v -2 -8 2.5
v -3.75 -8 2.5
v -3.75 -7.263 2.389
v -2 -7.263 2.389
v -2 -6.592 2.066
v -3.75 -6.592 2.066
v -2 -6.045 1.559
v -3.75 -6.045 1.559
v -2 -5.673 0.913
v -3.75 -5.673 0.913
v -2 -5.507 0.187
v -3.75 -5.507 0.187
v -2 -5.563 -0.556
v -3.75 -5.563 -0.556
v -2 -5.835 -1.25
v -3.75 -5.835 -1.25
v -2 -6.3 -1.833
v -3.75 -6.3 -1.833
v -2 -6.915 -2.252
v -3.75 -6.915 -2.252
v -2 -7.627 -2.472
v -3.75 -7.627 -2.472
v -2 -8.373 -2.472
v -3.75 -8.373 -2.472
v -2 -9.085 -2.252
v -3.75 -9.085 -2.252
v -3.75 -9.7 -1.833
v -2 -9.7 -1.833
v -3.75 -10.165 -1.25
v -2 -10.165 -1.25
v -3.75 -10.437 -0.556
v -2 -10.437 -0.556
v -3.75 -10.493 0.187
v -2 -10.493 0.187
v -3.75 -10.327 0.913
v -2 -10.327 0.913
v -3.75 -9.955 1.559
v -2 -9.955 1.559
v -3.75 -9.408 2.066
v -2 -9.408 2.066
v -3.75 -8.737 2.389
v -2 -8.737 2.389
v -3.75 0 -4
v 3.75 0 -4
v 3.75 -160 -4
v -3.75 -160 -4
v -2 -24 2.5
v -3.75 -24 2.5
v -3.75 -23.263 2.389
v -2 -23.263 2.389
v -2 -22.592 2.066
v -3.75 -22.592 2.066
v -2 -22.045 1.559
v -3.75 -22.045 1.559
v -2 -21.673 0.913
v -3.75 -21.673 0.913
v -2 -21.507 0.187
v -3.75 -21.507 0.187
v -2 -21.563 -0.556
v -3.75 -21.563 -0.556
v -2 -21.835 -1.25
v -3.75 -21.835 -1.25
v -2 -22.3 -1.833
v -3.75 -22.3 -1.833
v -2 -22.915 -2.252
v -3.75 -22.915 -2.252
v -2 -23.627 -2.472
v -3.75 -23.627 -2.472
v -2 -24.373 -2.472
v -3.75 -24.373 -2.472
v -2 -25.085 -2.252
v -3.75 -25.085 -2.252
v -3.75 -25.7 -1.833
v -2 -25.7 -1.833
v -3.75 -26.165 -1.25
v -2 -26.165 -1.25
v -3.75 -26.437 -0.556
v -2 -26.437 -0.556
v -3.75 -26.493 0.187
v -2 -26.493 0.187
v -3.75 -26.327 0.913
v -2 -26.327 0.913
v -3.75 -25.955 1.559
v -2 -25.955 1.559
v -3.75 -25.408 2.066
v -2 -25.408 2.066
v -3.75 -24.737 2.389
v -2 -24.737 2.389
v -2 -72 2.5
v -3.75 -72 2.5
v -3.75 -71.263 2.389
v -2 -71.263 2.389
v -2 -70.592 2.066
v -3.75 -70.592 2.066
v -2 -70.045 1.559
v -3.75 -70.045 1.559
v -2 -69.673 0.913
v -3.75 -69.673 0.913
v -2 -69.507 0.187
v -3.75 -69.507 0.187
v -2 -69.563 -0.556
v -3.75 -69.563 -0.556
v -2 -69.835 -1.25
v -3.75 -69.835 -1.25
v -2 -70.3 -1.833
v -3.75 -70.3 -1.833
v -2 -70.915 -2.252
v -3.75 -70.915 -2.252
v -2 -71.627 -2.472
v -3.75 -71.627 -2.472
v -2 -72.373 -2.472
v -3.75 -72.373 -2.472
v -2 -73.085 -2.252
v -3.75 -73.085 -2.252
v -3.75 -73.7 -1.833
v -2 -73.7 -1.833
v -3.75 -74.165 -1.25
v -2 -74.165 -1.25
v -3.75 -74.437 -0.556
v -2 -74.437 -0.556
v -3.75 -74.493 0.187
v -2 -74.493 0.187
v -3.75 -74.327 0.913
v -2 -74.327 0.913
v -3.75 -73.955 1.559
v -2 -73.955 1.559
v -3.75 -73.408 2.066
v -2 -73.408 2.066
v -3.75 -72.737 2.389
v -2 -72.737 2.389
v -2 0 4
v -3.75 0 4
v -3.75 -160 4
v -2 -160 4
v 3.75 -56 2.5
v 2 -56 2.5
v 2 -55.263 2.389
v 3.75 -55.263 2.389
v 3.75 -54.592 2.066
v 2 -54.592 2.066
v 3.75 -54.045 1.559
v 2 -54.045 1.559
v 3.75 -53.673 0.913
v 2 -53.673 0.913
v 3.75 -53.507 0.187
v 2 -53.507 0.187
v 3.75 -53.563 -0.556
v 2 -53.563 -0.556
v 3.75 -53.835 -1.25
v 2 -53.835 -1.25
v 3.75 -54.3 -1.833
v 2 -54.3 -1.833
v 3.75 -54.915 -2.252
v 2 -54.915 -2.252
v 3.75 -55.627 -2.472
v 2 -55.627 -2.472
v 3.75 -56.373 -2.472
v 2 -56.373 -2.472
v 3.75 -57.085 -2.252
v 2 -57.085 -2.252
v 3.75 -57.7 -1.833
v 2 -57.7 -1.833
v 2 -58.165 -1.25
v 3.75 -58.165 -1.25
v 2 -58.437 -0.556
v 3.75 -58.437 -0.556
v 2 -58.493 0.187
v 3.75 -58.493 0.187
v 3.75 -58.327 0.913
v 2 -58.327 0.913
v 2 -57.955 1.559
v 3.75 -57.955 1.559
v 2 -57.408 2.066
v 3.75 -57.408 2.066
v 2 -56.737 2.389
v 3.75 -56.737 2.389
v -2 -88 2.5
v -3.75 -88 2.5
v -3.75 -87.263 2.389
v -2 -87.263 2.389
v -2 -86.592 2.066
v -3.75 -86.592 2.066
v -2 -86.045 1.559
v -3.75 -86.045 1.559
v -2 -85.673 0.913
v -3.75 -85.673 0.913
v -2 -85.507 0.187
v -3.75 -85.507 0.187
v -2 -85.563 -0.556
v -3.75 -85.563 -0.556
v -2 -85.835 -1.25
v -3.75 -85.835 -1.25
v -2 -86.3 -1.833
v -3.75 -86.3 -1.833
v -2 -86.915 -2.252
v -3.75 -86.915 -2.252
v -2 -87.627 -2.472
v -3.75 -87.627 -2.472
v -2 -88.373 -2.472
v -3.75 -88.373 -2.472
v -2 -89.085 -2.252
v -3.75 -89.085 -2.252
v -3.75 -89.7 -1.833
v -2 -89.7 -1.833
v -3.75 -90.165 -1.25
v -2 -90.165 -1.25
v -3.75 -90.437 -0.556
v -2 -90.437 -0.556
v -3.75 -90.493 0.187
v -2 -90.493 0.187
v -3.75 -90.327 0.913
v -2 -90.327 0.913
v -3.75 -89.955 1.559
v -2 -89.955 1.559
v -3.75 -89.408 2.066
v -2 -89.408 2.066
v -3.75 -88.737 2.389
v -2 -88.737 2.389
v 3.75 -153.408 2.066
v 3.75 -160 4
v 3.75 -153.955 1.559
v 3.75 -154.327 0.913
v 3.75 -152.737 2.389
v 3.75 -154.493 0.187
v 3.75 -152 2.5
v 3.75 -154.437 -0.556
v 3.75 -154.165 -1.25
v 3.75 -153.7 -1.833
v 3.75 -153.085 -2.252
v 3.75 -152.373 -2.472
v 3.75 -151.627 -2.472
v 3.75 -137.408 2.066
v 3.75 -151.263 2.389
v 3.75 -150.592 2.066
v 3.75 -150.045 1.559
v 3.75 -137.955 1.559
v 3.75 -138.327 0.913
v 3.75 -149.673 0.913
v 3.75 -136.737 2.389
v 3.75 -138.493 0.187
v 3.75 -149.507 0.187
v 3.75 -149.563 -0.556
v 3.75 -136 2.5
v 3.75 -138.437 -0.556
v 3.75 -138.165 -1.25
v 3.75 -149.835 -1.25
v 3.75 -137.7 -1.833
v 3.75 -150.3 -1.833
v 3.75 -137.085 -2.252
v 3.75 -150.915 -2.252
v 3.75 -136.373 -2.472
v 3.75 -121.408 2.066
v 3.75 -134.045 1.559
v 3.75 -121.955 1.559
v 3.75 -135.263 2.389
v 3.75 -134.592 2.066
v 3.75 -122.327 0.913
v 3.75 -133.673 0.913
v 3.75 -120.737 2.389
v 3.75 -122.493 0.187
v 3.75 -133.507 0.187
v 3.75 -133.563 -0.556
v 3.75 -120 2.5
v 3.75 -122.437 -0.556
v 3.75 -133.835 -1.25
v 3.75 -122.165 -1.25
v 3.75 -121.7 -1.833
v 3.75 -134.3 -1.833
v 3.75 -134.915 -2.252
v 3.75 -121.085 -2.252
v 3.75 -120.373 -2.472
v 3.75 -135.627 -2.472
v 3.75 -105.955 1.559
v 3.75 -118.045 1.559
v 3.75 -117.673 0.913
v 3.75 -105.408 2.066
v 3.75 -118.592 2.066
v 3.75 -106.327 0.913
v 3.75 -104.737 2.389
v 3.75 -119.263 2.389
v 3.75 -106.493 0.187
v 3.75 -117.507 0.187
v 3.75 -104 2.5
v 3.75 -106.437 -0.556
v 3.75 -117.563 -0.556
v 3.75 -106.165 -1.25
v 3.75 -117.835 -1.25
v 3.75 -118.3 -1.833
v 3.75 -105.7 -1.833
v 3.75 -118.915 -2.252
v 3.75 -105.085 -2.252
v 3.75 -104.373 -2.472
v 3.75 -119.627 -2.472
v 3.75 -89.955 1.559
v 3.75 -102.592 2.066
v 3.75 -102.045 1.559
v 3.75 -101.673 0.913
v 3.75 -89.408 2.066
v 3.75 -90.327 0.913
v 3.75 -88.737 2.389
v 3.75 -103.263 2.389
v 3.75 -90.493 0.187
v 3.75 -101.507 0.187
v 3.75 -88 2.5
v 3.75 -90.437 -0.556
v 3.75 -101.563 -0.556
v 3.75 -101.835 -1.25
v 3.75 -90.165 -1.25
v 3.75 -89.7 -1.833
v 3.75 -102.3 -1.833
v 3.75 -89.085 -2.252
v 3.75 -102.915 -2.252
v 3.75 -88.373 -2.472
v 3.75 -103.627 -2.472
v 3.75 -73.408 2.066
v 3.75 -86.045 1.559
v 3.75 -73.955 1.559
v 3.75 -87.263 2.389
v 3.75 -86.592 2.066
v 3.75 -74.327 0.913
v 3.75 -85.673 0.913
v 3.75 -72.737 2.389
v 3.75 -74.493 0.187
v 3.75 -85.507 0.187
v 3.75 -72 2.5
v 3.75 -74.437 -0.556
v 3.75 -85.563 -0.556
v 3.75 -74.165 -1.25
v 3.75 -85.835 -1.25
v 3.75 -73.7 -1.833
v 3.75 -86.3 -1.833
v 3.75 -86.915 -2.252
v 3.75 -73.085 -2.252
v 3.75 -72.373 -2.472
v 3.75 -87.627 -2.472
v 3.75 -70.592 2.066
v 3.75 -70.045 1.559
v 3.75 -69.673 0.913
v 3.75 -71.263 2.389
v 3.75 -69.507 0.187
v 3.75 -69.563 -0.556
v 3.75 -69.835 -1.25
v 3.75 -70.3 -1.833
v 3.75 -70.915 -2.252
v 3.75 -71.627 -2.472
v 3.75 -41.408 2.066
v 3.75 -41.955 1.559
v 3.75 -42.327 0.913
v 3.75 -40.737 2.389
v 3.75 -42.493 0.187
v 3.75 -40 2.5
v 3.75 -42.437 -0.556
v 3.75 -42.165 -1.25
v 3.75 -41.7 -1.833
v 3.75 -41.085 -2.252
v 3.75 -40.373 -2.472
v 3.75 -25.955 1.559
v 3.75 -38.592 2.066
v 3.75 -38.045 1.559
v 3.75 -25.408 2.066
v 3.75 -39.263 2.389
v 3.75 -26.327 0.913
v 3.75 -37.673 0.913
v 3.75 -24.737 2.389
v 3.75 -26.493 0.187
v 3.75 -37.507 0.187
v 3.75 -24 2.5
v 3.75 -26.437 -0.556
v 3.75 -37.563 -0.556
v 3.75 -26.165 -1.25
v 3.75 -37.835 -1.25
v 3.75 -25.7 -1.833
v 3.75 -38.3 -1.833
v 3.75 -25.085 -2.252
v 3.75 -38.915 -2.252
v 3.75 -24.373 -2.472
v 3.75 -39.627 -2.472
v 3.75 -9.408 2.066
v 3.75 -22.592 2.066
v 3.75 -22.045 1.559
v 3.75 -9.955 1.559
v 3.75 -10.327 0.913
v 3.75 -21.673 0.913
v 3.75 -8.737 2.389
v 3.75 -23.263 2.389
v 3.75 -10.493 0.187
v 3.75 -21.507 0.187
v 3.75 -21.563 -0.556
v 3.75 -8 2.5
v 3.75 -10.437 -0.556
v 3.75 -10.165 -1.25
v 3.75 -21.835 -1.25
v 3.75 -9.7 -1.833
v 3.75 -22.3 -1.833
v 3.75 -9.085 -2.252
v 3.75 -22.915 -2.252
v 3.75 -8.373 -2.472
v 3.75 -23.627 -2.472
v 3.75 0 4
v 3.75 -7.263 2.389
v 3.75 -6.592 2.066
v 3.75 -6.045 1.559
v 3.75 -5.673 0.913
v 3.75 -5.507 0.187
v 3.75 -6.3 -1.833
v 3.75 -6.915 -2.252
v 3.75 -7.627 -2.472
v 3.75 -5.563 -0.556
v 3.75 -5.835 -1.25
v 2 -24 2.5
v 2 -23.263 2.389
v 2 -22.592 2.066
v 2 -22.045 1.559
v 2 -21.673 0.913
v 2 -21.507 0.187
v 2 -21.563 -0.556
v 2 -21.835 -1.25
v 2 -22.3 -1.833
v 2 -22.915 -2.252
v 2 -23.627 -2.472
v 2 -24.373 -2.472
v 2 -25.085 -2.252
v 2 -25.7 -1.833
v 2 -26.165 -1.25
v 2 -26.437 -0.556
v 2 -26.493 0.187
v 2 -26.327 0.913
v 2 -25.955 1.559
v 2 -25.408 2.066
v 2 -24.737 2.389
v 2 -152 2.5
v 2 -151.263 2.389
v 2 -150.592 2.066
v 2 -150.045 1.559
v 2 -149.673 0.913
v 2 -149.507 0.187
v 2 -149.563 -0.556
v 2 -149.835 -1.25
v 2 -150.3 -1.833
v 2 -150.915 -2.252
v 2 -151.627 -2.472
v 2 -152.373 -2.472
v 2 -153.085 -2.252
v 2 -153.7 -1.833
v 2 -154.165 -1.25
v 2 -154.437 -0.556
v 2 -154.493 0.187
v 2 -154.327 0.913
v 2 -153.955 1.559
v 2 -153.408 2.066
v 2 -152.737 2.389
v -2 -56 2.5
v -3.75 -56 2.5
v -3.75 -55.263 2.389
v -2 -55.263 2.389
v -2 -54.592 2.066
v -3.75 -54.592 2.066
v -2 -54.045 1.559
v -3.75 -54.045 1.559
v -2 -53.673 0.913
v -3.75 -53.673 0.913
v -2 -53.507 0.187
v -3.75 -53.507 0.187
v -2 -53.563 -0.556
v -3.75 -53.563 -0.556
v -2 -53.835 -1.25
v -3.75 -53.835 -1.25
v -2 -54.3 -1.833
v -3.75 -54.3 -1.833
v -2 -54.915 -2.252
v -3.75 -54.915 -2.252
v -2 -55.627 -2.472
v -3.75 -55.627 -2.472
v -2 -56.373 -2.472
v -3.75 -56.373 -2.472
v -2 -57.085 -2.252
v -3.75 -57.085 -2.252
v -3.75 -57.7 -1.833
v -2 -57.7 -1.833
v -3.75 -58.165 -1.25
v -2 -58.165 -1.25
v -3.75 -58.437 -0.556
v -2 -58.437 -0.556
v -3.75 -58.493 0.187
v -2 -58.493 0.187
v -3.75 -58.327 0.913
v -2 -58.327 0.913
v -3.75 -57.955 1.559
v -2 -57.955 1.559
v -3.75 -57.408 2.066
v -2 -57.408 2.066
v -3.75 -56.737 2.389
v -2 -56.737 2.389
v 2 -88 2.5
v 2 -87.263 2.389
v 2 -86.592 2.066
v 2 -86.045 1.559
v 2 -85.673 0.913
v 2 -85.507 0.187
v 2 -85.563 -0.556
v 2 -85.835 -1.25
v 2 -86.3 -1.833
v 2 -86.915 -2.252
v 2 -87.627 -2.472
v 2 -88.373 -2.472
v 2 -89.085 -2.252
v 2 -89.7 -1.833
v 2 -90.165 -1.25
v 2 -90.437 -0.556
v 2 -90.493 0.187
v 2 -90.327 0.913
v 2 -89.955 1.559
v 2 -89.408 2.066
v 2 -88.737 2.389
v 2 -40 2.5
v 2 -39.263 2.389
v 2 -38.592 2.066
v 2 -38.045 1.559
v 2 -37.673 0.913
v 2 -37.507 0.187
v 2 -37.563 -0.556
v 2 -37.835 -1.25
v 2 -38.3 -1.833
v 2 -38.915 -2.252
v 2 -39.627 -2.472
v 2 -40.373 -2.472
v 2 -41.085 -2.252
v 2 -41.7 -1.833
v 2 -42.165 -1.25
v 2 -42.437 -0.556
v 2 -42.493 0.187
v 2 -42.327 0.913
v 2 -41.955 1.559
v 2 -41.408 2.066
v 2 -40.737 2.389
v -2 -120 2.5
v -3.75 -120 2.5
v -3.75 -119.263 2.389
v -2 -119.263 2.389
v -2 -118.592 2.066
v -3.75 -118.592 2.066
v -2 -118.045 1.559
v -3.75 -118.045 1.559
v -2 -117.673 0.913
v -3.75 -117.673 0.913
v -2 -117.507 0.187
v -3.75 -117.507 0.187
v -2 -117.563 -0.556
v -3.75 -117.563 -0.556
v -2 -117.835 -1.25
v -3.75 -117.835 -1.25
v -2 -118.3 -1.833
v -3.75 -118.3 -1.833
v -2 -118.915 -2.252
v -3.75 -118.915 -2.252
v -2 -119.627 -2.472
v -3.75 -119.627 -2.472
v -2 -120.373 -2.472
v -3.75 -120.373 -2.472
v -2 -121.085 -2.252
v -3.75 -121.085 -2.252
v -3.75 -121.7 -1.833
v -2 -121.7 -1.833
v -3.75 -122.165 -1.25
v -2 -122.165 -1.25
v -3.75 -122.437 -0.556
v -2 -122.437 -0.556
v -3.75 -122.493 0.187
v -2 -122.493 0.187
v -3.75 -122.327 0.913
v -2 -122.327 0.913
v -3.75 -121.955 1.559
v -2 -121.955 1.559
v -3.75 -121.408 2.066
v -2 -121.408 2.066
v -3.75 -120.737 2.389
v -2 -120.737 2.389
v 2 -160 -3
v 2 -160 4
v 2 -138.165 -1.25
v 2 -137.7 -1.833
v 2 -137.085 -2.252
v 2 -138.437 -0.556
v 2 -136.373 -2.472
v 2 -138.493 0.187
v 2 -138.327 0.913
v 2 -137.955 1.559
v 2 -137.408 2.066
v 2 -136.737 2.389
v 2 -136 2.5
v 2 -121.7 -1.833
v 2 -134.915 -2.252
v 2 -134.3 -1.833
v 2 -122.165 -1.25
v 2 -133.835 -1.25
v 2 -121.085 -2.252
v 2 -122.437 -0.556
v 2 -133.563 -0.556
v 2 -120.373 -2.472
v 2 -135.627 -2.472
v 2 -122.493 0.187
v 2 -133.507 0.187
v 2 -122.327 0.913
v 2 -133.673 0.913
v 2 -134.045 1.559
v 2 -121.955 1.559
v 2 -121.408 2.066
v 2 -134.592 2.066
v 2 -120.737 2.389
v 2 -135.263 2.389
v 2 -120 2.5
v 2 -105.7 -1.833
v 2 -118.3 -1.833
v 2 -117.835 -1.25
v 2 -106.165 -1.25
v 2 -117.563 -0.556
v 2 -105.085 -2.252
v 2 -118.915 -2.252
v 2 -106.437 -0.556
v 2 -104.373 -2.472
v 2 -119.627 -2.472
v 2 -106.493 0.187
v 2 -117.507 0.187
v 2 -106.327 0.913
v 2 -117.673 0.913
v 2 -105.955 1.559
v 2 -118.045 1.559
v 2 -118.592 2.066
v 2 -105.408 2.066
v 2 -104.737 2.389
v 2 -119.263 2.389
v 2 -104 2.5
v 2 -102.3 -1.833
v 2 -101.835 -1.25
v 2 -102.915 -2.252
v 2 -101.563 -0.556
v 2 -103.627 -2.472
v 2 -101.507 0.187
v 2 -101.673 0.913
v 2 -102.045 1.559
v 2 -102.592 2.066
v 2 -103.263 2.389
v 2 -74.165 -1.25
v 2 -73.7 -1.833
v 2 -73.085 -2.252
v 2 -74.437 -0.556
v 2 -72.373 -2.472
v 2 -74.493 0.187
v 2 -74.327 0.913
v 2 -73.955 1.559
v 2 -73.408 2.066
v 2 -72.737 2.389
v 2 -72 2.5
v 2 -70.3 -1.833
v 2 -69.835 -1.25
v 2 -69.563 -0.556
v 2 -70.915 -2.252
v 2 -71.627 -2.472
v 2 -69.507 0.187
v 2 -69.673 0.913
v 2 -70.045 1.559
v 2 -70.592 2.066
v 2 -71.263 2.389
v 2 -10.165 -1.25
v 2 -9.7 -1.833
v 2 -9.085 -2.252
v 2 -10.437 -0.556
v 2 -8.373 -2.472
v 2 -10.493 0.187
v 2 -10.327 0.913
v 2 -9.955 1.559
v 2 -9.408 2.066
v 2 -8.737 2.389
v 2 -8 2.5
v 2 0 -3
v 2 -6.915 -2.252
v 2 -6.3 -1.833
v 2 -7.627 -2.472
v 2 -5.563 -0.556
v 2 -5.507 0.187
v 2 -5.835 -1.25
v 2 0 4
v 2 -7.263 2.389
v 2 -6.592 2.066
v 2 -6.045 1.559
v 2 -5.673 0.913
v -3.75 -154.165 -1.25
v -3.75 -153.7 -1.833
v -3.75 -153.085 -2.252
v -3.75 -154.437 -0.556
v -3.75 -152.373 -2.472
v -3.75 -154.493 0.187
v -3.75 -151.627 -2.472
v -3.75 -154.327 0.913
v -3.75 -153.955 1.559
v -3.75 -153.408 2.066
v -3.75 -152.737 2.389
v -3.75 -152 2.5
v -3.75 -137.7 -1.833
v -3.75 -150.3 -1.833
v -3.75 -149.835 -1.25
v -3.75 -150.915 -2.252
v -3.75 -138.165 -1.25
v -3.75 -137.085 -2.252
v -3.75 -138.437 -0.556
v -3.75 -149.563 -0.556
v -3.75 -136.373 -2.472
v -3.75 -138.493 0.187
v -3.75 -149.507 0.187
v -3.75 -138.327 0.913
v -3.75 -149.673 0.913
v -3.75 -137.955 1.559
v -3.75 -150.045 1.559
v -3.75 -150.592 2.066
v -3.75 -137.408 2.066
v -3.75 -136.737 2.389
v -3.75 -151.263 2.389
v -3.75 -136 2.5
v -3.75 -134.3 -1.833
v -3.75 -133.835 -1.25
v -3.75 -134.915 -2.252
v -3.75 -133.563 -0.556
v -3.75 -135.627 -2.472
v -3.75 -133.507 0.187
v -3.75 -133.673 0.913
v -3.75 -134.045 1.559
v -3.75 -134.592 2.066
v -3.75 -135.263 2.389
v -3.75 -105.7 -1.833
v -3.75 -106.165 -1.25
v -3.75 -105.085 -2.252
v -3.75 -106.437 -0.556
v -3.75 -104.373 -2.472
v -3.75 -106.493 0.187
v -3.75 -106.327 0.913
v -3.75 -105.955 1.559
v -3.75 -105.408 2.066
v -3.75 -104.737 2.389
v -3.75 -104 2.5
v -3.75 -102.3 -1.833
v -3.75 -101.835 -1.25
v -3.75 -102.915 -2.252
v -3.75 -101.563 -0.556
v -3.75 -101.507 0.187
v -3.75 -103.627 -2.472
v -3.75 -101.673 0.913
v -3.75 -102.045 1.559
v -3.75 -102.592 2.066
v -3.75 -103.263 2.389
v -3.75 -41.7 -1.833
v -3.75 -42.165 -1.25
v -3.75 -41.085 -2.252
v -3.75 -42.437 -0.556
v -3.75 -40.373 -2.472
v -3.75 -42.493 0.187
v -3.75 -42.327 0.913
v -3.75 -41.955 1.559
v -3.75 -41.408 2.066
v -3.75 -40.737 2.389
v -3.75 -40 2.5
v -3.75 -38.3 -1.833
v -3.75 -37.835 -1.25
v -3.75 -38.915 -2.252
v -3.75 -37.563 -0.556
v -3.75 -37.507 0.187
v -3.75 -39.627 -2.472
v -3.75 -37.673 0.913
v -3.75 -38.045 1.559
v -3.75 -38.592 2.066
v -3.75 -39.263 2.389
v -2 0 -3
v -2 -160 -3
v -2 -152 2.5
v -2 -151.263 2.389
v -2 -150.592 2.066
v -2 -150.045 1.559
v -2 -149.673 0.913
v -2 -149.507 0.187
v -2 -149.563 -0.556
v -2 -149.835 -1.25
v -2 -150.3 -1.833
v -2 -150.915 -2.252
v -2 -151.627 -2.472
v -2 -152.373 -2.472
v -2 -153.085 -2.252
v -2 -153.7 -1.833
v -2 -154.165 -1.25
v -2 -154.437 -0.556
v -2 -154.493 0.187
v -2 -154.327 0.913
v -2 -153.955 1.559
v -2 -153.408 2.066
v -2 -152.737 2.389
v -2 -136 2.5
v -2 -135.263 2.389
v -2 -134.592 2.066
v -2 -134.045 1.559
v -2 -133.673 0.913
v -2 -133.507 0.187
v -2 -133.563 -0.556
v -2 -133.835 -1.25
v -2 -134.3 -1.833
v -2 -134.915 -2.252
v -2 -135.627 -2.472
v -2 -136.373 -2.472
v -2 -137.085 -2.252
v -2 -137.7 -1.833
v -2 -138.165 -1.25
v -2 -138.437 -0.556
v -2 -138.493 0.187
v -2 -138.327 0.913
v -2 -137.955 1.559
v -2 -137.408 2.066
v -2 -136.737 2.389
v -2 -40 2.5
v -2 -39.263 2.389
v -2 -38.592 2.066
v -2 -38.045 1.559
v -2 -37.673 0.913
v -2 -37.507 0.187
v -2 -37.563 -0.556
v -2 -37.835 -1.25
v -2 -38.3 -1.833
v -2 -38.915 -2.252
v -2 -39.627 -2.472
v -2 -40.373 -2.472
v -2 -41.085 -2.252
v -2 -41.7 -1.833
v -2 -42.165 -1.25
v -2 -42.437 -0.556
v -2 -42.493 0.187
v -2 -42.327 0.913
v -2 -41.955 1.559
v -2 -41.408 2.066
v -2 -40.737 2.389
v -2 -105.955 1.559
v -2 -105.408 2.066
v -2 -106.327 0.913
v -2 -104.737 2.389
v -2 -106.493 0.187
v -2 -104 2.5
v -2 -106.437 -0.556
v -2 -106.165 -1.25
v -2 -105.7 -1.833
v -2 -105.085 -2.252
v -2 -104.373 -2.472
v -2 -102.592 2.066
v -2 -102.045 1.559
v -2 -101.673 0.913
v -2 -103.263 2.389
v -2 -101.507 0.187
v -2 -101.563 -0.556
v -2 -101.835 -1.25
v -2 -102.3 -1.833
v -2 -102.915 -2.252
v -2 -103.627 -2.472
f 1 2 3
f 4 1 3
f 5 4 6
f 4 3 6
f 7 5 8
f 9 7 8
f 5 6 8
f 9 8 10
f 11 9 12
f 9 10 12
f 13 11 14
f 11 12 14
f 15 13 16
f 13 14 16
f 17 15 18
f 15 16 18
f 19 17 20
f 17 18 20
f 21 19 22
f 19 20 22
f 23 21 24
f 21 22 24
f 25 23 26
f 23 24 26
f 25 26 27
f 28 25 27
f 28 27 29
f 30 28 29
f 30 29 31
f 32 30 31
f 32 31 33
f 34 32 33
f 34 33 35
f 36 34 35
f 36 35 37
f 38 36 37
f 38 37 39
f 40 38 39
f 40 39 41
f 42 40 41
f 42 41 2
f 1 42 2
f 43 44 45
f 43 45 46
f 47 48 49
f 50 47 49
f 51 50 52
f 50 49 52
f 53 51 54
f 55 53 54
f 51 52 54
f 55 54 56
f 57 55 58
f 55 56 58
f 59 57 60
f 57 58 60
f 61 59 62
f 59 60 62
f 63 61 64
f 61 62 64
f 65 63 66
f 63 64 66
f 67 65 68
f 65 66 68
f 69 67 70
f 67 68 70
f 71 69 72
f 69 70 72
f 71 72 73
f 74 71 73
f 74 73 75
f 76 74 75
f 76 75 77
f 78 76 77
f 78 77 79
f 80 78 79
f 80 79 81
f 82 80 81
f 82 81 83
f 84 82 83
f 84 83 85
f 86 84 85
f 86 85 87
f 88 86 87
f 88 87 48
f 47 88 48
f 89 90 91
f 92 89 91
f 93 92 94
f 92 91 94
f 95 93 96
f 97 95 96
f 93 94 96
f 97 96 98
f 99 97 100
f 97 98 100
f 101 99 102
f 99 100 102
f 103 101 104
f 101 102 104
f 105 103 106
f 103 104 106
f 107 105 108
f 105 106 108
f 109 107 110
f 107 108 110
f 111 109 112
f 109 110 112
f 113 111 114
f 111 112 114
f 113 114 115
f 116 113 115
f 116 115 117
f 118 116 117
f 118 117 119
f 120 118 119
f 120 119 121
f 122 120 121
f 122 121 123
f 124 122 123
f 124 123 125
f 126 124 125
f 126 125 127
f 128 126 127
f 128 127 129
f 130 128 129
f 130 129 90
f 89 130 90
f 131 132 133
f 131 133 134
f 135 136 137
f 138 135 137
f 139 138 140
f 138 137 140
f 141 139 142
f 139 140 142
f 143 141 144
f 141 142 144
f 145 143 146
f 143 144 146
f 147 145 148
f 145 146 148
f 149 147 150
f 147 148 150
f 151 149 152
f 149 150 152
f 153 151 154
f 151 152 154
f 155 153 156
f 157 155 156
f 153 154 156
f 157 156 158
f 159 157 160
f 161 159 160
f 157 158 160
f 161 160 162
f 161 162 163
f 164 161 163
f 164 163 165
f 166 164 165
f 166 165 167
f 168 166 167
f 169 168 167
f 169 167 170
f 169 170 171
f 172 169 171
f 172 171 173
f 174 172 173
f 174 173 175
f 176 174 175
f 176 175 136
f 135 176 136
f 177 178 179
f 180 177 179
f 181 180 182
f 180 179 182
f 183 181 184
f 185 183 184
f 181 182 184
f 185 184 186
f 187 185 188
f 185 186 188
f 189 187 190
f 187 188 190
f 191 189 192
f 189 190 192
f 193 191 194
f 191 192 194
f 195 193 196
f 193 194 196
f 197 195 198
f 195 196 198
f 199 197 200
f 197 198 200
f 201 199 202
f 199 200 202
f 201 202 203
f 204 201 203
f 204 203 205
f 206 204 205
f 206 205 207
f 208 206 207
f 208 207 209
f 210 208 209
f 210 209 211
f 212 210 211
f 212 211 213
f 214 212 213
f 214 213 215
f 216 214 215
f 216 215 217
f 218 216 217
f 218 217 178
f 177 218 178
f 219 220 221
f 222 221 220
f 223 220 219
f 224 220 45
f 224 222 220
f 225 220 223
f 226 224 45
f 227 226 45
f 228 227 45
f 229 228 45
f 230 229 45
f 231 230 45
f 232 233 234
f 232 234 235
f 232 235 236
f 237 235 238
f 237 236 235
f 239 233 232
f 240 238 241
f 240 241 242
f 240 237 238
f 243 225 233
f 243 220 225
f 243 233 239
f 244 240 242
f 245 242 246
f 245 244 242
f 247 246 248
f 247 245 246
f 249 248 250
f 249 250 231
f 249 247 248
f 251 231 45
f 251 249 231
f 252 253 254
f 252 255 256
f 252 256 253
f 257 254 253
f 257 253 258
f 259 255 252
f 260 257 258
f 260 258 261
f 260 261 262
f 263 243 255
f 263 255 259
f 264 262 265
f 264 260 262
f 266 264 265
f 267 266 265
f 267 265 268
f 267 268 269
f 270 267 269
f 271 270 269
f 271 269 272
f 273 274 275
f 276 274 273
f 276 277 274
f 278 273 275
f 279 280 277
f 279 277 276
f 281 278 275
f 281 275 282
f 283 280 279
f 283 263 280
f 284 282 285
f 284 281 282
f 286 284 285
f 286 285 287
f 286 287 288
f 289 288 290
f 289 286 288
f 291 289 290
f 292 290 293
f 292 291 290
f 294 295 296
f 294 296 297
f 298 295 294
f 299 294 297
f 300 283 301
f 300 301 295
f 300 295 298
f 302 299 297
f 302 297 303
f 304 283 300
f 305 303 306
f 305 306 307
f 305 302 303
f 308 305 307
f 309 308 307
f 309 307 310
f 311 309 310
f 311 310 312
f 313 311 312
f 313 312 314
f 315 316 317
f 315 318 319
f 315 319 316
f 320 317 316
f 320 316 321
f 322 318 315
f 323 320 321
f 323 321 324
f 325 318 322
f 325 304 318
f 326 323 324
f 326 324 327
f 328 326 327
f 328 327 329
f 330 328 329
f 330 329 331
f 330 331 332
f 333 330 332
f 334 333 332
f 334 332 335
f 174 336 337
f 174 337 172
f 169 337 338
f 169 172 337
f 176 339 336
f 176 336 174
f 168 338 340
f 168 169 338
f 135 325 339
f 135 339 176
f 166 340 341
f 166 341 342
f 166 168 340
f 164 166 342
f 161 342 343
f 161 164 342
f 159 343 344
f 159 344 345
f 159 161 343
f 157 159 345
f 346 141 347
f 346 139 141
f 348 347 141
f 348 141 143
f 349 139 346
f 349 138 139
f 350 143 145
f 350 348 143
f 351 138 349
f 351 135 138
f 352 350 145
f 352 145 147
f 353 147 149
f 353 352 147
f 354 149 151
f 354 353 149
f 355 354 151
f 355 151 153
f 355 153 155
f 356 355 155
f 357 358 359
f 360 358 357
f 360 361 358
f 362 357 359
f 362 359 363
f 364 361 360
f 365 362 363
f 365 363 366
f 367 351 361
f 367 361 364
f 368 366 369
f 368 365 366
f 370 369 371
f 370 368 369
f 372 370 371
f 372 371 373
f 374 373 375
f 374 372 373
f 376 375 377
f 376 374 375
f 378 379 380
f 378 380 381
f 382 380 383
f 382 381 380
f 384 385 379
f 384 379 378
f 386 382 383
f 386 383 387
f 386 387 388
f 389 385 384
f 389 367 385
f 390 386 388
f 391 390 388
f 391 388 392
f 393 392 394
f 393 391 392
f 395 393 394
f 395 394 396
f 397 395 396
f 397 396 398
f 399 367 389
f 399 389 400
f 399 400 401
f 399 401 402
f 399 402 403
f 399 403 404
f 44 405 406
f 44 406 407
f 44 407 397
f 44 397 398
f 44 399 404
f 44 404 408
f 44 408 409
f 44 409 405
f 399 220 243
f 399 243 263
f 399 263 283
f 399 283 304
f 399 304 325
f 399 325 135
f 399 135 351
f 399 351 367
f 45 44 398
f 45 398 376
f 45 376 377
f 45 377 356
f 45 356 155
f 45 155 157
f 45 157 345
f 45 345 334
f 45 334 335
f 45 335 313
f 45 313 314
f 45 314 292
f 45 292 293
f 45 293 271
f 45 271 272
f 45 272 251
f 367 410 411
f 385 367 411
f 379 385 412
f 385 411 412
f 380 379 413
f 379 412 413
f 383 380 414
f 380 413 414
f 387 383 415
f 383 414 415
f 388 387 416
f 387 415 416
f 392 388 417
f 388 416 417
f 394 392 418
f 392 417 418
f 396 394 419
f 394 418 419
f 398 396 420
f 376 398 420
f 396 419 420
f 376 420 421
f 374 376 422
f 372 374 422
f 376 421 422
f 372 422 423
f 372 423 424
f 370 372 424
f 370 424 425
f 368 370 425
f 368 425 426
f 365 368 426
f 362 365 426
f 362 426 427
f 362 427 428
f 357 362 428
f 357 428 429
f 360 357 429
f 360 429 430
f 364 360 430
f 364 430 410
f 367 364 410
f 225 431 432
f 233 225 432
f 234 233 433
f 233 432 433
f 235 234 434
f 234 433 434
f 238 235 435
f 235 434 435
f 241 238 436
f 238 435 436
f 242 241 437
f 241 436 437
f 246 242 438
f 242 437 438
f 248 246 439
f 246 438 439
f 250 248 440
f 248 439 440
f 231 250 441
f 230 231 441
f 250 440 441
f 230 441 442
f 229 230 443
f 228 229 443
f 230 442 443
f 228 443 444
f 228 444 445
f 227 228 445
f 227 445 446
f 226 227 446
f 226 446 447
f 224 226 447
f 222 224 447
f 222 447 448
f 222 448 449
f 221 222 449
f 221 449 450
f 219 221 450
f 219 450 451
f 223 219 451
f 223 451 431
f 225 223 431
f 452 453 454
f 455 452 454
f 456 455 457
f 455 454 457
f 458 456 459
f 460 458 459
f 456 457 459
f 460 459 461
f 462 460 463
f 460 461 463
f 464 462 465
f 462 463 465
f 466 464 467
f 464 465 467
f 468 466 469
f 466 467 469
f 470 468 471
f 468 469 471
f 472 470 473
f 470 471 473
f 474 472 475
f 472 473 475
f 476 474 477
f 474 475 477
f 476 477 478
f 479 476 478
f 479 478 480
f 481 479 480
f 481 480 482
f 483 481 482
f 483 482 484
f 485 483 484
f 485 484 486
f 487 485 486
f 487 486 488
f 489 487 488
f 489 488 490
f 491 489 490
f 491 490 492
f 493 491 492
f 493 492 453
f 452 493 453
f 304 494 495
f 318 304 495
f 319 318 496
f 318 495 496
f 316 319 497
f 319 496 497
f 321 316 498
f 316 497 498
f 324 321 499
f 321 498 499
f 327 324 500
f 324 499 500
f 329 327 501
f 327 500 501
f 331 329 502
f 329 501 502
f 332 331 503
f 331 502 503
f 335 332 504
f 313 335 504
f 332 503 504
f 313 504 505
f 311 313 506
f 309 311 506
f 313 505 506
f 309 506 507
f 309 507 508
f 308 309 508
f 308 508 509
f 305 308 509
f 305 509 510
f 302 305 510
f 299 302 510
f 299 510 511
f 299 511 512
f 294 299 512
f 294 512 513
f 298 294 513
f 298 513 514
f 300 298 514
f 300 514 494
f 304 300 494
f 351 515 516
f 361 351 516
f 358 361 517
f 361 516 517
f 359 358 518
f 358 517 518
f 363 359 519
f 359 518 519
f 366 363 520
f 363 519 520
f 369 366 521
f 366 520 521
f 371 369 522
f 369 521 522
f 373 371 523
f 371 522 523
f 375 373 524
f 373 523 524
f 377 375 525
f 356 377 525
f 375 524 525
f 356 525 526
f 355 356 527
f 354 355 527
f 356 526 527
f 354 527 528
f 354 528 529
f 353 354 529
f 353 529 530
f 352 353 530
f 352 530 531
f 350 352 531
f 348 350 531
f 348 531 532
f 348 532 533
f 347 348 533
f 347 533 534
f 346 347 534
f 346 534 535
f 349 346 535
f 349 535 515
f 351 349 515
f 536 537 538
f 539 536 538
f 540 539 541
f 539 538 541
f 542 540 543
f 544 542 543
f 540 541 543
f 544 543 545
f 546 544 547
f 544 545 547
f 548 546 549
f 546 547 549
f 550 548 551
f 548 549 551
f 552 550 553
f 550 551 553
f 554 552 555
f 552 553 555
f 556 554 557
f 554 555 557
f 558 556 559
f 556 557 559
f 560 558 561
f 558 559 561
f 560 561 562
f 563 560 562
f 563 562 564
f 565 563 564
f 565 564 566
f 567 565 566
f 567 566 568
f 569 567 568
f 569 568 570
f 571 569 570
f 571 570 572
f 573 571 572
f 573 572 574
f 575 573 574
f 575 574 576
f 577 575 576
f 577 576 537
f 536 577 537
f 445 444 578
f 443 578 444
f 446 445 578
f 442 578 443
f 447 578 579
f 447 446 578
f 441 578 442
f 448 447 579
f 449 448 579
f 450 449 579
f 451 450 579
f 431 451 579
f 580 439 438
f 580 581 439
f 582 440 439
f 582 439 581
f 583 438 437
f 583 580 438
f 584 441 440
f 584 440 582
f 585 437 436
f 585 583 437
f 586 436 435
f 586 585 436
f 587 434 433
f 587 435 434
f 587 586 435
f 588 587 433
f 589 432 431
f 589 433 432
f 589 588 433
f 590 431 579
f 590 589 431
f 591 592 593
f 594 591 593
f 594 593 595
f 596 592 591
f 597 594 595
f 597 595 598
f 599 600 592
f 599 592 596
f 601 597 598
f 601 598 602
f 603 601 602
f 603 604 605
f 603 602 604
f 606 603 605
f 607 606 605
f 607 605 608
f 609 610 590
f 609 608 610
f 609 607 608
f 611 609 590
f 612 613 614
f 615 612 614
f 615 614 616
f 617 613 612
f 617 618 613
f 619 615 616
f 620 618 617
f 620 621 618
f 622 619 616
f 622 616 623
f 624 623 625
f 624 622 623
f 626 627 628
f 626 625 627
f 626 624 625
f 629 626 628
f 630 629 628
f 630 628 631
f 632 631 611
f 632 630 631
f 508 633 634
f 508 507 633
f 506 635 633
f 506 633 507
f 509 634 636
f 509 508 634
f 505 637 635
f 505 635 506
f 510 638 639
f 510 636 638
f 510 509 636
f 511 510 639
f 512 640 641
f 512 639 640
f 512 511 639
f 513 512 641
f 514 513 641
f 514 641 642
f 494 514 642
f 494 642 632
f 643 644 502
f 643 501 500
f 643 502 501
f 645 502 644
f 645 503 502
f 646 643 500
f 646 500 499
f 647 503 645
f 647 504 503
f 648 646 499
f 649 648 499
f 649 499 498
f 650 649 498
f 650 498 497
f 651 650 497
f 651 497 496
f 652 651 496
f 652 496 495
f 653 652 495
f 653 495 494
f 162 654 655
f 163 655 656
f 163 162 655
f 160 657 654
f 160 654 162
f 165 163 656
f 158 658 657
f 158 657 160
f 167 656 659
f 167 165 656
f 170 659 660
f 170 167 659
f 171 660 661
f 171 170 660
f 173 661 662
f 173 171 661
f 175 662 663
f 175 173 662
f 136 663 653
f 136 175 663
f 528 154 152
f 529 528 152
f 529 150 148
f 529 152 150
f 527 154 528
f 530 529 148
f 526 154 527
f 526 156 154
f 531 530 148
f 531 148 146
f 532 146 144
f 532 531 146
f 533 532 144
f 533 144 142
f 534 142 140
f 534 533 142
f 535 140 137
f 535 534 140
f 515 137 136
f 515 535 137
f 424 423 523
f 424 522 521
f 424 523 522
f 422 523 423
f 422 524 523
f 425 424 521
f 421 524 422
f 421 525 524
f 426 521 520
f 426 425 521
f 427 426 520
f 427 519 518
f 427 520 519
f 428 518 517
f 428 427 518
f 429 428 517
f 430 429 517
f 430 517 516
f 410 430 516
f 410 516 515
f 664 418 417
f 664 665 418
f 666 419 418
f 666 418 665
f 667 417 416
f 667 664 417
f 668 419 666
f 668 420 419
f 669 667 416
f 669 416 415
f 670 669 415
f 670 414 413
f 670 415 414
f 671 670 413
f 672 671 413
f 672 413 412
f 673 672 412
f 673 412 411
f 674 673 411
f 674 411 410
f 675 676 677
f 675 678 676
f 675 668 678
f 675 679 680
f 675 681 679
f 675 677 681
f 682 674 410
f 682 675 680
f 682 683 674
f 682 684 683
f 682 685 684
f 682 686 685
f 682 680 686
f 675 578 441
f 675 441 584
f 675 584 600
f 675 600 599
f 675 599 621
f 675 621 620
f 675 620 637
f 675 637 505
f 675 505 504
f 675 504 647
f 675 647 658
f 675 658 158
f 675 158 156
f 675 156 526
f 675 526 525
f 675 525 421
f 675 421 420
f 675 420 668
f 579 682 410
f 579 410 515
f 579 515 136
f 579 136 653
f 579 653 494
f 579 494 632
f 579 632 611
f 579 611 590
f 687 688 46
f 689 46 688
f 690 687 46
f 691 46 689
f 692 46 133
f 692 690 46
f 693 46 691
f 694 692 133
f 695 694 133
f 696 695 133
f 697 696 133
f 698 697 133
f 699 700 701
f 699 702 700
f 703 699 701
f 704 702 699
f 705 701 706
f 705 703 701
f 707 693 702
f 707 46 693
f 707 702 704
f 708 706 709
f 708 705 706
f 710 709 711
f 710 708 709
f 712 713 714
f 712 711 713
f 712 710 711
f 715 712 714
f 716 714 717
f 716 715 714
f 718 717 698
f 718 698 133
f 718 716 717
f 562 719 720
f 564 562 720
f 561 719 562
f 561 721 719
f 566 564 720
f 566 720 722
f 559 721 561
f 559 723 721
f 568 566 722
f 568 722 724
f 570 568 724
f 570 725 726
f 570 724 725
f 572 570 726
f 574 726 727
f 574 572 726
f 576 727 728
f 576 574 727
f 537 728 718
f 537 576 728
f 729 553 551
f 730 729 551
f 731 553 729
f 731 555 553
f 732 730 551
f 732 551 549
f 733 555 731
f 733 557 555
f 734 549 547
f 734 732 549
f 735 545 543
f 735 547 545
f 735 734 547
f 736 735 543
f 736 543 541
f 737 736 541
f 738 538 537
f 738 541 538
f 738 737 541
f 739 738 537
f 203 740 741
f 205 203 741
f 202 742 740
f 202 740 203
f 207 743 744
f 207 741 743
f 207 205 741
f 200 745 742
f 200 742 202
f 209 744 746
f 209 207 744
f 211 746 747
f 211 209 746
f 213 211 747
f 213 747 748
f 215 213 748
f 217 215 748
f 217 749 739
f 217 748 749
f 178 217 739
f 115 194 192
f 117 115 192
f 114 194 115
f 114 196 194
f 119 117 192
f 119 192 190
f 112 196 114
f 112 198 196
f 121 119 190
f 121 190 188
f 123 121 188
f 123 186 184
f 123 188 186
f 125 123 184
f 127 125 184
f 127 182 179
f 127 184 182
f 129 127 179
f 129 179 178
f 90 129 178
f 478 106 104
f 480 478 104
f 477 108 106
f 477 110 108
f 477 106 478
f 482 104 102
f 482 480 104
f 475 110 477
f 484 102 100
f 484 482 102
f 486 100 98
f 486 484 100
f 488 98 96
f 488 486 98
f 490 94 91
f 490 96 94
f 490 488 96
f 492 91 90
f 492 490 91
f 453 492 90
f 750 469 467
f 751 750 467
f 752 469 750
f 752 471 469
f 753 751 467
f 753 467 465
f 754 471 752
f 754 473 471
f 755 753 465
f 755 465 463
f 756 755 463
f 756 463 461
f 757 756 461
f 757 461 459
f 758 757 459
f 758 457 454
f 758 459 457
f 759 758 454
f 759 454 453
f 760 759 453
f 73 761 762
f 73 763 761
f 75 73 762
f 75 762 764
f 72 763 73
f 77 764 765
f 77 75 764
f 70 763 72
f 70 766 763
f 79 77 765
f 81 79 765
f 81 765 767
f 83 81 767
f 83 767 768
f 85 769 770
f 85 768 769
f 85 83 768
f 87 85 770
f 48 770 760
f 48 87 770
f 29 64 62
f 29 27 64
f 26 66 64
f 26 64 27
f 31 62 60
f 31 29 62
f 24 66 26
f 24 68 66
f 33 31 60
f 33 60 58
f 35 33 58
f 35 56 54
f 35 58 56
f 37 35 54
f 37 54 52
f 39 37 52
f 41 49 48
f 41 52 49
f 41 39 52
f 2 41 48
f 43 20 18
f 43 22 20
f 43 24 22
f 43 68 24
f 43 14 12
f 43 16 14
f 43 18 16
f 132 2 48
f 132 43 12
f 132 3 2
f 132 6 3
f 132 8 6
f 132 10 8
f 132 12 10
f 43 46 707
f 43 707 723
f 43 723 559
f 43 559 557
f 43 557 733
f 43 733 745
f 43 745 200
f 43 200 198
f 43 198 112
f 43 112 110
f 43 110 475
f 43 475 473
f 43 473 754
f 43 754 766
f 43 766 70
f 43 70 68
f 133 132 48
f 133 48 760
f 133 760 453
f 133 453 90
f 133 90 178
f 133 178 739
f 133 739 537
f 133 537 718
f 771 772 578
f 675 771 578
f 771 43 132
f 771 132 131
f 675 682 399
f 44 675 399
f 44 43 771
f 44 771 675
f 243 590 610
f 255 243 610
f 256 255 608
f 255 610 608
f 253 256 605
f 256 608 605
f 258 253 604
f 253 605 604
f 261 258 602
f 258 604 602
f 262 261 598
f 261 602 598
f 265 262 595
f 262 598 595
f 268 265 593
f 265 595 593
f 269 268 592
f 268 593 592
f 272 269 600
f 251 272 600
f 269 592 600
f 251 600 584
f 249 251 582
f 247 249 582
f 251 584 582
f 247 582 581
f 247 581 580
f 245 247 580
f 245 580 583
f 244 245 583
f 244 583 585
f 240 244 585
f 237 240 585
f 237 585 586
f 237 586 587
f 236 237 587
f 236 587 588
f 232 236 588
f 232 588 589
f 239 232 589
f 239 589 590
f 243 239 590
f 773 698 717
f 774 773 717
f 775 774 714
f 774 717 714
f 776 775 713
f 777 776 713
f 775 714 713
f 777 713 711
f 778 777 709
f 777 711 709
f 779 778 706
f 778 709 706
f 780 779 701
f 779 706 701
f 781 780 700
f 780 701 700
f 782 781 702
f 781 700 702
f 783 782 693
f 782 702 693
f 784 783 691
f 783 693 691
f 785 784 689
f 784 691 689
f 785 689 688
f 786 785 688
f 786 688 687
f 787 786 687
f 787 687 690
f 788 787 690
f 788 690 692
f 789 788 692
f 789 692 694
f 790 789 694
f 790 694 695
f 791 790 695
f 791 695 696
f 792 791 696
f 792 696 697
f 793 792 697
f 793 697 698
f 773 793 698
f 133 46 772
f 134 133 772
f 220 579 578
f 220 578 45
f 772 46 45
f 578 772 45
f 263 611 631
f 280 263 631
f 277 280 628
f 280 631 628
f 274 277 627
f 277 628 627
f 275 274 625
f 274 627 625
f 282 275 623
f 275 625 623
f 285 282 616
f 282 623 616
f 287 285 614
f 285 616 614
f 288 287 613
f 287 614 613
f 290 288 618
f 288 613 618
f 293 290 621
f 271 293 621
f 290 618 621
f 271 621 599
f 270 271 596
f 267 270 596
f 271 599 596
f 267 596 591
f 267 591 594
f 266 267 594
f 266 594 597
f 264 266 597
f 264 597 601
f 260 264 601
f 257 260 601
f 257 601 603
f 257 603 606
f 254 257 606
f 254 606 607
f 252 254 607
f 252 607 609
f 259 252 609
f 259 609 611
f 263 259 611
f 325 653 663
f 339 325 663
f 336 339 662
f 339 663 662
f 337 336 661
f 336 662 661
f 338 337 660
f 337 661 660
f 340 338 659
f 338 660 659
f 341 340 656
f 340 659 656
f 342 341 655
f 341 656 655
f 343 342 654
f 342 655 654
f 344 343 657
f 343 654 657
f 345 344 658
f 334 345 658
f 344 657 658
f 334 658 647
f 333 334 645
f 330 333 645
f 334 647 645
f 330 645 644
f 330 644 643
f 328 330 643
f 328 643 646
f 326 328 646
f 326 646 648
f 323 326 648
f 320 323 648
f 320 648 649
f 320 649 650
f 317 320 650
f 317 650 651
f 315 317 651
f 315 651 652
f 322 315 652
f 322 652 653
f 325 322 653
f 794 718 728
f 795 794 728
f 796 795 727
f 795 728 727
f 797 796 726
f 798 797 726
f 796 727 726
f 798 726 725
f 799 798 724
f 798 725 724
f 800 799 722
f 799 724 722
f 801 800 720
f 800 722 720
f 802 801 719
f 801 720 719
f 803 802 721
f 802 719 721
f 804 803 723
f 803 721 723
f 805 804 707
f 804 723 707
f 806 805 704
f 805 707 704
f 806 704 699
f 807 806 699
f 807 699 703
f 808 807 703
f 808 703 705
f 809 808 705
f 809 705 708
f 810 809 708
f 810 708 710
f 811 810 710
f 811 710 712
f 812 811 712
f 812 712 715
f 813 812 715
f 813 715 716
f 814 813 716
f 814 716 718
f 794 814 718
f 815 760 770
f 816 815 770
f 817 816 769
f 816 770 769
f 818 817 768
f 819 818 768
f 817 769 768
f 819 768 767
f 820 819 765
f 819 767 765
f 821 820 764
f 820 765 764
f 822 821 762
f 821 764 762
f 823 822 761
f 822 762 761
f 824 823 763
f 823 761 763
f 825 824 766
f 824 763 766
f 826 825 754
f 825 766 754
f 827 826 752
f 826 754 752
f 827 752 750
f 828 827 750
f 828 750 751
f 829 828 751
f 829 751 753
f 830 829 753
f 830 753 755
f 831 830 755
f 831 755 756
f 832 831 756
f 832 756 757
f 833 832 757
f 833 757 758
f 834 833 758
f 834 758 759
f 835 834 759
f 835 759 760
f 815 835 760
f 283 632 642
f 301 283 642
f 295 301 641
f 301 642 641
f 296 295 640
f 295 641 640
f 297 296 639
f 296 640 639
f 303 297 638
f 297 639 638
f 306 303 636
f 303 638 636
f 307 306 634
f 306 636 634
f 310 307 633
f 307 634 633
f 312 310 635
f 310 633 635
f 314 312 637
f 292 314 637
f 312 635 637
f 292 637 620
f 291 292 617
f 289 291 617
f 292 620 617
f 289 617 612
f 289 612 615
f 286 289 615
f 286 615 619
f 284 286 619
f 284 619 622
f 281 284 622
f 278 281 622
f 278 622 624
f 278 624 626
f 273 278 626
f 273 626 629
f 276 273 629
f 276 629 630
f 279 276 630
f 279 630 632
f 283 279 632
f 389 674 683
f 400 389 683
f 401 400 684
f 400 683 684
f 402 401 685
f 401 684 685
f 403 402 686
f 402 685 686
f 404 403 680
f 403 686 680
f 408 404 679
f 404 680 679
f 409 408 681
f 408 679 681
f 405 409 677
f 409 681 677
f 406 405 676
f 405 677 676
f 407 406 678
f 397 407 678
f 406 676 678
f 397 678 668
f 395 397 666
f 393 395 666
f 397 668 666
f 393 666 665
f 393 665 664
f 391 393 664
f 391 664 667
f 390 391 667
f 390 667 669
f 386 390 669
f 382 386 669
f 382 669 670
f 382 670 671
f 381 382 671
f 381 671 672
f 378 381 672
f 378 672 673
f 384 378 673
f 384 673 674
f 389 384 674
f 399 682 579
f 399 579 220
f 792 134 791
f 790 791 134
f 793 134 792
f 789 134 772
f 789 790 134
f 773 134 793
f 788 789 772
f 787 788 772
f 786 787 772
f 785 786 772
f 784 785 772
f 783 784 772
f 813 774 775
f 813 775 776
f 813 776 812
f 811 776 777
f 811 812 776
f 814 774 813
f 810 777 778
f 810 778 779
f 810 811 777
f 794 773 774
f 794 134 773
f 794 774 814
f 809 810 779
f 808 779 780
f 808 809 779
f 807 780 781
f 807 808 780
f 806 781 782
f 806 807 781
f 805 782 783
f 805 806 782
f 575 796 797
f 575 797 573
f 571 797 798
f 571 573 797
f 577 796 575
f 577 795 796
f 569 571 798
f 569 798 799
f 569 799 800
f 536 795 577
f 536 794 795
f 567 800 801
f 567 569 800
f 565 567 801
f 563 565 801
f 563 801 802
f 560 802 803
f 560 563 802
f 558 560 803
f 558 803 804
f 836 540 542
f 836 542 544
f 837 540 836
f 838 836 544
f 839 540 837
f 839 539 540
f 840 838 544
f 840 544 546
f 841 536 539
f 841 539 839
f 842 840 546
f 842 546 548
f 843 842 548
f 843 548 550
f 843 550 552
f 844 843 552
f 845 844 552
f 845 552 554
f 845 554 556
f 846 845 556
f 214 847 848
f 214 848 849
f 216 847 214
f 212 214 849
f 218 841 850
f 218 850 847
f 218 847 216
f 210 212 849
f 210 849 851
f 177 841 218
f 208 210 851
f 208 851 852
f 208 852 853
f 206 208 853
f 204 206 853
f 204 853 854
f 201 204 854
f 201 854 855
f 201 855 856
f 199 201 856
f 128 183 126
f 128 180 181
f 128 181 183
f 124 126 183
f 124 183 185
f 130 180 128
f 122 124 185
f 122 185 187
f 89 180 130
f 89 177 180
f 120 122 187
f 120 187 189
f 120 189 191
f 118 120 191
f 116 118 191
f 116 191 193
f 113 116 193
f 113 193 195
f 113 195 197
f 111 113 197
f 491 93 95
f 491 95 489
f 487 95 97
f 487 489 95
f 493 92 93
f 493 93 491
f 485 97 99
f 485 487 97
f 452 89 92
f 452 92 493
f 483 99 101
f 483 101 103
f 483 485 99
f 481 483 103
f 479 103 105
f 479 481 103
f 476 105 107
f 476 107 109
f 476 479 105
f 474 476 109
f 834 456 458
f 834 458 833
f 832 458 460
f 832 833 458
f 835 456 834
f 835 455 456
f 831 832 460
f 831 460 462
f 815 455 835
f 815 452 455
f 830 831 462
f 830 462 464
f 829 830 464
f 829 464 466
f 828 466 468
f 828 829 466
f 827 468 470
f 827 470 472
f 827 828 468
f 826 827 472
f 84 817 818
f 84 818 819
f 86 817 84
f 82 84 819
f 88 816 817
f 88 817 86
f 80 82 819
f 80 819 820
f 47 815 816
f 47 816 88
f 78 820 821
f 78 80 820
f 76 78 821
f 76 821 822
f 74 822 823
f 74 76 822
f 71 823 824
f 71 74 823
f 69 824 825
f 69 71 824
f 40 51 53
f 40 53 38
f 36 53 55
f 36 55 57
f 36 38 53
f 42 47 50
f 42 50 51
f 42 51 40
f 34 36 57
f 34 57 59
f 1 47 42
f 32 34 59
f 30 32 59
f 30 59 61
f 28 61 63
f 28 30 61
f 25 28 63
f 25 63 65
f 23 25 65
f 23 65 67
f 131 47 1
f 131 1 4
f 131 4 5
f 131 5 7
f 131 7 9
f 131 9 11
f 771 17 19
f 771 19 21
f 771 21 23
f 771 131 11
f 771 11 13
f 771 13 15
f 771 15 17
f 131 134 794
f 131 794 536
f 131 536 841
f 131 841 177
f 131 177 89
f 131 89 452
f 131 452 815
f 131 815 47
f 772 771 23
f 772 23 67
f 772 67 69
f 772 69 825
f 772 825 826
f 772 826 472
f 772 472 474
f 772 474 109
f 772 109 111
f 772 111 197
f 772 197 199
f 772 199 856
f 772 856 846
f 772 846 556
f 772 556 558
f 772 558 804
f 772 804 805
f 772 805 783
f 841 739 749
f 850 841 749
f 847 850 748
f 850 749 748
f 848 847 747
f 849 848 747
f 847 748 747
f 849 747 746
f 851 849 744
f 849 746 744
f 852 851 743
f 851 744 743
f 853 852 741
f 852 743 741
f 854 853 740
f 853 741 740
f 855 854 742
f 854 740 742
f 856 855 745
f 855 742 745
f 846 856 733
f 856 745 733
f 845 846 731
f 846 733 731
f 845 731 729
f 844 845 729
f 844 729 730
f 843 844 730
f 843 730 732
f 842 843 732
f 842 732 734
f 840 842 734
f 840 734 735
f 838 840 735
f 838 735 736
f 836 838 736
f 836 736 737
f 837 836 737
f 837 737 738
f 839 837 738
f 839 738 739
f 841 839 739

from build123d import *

# Parameters (mm, degrees)
BASE_DEPTH  = 160
ESQUISSE2_R = 2.5
TROU_DEPTH  = 161.225622171


with BuildPart() as part:
    # Esquisse1 → Base (new body)
    with BuildSketch(Plane(origin=(0, 0, 0), x_dir=(1, 0, 0), z_dir=(0, 1, 0))):
        Polygon((-2, -4), (-2, 3), (2, 3), (2, -4), (3.75, -4), (3.75, 4), (-3.75, 4), (-3.75, -4), align=None)
    extrude(amount=-BASE_DEPTH)

    # Esquisse2 → Trou (cut, through all)
    with BuildSketch(Plane.ZY.offset(3.75)):
        with Locations((0, -8)):
            Circle(ESQUISSE2_R)
        with Locations((0, -24)):
            Circle(ESQUISSE2_R)
        with Locations((0, -40)):
            Circle(ESQUISSE2_R)
        with Locations((0, -56)):
            Circle(ESQUISSE2_R)
        with Locations((0, -72)):
            Circle(ESQUISSE2_R)
        with Locations((0, -88)):
            Circle(ESQUISSE2_R)
        with Locations((0, -104)):
            Circle(ESQUISSE2_R)
        with Locations((0, -120)):
            Circle(ESQUISSE2_R)
        with Locations((0, -136)):
            Circle(ESQUISSE2_R)
        with Locations((0, -152)):
            Circle(ESQUISSE2_R)
    extrude(amount=-TROU_DEPTH, mode=Mode.SUBTRACT)


solid = part.part
